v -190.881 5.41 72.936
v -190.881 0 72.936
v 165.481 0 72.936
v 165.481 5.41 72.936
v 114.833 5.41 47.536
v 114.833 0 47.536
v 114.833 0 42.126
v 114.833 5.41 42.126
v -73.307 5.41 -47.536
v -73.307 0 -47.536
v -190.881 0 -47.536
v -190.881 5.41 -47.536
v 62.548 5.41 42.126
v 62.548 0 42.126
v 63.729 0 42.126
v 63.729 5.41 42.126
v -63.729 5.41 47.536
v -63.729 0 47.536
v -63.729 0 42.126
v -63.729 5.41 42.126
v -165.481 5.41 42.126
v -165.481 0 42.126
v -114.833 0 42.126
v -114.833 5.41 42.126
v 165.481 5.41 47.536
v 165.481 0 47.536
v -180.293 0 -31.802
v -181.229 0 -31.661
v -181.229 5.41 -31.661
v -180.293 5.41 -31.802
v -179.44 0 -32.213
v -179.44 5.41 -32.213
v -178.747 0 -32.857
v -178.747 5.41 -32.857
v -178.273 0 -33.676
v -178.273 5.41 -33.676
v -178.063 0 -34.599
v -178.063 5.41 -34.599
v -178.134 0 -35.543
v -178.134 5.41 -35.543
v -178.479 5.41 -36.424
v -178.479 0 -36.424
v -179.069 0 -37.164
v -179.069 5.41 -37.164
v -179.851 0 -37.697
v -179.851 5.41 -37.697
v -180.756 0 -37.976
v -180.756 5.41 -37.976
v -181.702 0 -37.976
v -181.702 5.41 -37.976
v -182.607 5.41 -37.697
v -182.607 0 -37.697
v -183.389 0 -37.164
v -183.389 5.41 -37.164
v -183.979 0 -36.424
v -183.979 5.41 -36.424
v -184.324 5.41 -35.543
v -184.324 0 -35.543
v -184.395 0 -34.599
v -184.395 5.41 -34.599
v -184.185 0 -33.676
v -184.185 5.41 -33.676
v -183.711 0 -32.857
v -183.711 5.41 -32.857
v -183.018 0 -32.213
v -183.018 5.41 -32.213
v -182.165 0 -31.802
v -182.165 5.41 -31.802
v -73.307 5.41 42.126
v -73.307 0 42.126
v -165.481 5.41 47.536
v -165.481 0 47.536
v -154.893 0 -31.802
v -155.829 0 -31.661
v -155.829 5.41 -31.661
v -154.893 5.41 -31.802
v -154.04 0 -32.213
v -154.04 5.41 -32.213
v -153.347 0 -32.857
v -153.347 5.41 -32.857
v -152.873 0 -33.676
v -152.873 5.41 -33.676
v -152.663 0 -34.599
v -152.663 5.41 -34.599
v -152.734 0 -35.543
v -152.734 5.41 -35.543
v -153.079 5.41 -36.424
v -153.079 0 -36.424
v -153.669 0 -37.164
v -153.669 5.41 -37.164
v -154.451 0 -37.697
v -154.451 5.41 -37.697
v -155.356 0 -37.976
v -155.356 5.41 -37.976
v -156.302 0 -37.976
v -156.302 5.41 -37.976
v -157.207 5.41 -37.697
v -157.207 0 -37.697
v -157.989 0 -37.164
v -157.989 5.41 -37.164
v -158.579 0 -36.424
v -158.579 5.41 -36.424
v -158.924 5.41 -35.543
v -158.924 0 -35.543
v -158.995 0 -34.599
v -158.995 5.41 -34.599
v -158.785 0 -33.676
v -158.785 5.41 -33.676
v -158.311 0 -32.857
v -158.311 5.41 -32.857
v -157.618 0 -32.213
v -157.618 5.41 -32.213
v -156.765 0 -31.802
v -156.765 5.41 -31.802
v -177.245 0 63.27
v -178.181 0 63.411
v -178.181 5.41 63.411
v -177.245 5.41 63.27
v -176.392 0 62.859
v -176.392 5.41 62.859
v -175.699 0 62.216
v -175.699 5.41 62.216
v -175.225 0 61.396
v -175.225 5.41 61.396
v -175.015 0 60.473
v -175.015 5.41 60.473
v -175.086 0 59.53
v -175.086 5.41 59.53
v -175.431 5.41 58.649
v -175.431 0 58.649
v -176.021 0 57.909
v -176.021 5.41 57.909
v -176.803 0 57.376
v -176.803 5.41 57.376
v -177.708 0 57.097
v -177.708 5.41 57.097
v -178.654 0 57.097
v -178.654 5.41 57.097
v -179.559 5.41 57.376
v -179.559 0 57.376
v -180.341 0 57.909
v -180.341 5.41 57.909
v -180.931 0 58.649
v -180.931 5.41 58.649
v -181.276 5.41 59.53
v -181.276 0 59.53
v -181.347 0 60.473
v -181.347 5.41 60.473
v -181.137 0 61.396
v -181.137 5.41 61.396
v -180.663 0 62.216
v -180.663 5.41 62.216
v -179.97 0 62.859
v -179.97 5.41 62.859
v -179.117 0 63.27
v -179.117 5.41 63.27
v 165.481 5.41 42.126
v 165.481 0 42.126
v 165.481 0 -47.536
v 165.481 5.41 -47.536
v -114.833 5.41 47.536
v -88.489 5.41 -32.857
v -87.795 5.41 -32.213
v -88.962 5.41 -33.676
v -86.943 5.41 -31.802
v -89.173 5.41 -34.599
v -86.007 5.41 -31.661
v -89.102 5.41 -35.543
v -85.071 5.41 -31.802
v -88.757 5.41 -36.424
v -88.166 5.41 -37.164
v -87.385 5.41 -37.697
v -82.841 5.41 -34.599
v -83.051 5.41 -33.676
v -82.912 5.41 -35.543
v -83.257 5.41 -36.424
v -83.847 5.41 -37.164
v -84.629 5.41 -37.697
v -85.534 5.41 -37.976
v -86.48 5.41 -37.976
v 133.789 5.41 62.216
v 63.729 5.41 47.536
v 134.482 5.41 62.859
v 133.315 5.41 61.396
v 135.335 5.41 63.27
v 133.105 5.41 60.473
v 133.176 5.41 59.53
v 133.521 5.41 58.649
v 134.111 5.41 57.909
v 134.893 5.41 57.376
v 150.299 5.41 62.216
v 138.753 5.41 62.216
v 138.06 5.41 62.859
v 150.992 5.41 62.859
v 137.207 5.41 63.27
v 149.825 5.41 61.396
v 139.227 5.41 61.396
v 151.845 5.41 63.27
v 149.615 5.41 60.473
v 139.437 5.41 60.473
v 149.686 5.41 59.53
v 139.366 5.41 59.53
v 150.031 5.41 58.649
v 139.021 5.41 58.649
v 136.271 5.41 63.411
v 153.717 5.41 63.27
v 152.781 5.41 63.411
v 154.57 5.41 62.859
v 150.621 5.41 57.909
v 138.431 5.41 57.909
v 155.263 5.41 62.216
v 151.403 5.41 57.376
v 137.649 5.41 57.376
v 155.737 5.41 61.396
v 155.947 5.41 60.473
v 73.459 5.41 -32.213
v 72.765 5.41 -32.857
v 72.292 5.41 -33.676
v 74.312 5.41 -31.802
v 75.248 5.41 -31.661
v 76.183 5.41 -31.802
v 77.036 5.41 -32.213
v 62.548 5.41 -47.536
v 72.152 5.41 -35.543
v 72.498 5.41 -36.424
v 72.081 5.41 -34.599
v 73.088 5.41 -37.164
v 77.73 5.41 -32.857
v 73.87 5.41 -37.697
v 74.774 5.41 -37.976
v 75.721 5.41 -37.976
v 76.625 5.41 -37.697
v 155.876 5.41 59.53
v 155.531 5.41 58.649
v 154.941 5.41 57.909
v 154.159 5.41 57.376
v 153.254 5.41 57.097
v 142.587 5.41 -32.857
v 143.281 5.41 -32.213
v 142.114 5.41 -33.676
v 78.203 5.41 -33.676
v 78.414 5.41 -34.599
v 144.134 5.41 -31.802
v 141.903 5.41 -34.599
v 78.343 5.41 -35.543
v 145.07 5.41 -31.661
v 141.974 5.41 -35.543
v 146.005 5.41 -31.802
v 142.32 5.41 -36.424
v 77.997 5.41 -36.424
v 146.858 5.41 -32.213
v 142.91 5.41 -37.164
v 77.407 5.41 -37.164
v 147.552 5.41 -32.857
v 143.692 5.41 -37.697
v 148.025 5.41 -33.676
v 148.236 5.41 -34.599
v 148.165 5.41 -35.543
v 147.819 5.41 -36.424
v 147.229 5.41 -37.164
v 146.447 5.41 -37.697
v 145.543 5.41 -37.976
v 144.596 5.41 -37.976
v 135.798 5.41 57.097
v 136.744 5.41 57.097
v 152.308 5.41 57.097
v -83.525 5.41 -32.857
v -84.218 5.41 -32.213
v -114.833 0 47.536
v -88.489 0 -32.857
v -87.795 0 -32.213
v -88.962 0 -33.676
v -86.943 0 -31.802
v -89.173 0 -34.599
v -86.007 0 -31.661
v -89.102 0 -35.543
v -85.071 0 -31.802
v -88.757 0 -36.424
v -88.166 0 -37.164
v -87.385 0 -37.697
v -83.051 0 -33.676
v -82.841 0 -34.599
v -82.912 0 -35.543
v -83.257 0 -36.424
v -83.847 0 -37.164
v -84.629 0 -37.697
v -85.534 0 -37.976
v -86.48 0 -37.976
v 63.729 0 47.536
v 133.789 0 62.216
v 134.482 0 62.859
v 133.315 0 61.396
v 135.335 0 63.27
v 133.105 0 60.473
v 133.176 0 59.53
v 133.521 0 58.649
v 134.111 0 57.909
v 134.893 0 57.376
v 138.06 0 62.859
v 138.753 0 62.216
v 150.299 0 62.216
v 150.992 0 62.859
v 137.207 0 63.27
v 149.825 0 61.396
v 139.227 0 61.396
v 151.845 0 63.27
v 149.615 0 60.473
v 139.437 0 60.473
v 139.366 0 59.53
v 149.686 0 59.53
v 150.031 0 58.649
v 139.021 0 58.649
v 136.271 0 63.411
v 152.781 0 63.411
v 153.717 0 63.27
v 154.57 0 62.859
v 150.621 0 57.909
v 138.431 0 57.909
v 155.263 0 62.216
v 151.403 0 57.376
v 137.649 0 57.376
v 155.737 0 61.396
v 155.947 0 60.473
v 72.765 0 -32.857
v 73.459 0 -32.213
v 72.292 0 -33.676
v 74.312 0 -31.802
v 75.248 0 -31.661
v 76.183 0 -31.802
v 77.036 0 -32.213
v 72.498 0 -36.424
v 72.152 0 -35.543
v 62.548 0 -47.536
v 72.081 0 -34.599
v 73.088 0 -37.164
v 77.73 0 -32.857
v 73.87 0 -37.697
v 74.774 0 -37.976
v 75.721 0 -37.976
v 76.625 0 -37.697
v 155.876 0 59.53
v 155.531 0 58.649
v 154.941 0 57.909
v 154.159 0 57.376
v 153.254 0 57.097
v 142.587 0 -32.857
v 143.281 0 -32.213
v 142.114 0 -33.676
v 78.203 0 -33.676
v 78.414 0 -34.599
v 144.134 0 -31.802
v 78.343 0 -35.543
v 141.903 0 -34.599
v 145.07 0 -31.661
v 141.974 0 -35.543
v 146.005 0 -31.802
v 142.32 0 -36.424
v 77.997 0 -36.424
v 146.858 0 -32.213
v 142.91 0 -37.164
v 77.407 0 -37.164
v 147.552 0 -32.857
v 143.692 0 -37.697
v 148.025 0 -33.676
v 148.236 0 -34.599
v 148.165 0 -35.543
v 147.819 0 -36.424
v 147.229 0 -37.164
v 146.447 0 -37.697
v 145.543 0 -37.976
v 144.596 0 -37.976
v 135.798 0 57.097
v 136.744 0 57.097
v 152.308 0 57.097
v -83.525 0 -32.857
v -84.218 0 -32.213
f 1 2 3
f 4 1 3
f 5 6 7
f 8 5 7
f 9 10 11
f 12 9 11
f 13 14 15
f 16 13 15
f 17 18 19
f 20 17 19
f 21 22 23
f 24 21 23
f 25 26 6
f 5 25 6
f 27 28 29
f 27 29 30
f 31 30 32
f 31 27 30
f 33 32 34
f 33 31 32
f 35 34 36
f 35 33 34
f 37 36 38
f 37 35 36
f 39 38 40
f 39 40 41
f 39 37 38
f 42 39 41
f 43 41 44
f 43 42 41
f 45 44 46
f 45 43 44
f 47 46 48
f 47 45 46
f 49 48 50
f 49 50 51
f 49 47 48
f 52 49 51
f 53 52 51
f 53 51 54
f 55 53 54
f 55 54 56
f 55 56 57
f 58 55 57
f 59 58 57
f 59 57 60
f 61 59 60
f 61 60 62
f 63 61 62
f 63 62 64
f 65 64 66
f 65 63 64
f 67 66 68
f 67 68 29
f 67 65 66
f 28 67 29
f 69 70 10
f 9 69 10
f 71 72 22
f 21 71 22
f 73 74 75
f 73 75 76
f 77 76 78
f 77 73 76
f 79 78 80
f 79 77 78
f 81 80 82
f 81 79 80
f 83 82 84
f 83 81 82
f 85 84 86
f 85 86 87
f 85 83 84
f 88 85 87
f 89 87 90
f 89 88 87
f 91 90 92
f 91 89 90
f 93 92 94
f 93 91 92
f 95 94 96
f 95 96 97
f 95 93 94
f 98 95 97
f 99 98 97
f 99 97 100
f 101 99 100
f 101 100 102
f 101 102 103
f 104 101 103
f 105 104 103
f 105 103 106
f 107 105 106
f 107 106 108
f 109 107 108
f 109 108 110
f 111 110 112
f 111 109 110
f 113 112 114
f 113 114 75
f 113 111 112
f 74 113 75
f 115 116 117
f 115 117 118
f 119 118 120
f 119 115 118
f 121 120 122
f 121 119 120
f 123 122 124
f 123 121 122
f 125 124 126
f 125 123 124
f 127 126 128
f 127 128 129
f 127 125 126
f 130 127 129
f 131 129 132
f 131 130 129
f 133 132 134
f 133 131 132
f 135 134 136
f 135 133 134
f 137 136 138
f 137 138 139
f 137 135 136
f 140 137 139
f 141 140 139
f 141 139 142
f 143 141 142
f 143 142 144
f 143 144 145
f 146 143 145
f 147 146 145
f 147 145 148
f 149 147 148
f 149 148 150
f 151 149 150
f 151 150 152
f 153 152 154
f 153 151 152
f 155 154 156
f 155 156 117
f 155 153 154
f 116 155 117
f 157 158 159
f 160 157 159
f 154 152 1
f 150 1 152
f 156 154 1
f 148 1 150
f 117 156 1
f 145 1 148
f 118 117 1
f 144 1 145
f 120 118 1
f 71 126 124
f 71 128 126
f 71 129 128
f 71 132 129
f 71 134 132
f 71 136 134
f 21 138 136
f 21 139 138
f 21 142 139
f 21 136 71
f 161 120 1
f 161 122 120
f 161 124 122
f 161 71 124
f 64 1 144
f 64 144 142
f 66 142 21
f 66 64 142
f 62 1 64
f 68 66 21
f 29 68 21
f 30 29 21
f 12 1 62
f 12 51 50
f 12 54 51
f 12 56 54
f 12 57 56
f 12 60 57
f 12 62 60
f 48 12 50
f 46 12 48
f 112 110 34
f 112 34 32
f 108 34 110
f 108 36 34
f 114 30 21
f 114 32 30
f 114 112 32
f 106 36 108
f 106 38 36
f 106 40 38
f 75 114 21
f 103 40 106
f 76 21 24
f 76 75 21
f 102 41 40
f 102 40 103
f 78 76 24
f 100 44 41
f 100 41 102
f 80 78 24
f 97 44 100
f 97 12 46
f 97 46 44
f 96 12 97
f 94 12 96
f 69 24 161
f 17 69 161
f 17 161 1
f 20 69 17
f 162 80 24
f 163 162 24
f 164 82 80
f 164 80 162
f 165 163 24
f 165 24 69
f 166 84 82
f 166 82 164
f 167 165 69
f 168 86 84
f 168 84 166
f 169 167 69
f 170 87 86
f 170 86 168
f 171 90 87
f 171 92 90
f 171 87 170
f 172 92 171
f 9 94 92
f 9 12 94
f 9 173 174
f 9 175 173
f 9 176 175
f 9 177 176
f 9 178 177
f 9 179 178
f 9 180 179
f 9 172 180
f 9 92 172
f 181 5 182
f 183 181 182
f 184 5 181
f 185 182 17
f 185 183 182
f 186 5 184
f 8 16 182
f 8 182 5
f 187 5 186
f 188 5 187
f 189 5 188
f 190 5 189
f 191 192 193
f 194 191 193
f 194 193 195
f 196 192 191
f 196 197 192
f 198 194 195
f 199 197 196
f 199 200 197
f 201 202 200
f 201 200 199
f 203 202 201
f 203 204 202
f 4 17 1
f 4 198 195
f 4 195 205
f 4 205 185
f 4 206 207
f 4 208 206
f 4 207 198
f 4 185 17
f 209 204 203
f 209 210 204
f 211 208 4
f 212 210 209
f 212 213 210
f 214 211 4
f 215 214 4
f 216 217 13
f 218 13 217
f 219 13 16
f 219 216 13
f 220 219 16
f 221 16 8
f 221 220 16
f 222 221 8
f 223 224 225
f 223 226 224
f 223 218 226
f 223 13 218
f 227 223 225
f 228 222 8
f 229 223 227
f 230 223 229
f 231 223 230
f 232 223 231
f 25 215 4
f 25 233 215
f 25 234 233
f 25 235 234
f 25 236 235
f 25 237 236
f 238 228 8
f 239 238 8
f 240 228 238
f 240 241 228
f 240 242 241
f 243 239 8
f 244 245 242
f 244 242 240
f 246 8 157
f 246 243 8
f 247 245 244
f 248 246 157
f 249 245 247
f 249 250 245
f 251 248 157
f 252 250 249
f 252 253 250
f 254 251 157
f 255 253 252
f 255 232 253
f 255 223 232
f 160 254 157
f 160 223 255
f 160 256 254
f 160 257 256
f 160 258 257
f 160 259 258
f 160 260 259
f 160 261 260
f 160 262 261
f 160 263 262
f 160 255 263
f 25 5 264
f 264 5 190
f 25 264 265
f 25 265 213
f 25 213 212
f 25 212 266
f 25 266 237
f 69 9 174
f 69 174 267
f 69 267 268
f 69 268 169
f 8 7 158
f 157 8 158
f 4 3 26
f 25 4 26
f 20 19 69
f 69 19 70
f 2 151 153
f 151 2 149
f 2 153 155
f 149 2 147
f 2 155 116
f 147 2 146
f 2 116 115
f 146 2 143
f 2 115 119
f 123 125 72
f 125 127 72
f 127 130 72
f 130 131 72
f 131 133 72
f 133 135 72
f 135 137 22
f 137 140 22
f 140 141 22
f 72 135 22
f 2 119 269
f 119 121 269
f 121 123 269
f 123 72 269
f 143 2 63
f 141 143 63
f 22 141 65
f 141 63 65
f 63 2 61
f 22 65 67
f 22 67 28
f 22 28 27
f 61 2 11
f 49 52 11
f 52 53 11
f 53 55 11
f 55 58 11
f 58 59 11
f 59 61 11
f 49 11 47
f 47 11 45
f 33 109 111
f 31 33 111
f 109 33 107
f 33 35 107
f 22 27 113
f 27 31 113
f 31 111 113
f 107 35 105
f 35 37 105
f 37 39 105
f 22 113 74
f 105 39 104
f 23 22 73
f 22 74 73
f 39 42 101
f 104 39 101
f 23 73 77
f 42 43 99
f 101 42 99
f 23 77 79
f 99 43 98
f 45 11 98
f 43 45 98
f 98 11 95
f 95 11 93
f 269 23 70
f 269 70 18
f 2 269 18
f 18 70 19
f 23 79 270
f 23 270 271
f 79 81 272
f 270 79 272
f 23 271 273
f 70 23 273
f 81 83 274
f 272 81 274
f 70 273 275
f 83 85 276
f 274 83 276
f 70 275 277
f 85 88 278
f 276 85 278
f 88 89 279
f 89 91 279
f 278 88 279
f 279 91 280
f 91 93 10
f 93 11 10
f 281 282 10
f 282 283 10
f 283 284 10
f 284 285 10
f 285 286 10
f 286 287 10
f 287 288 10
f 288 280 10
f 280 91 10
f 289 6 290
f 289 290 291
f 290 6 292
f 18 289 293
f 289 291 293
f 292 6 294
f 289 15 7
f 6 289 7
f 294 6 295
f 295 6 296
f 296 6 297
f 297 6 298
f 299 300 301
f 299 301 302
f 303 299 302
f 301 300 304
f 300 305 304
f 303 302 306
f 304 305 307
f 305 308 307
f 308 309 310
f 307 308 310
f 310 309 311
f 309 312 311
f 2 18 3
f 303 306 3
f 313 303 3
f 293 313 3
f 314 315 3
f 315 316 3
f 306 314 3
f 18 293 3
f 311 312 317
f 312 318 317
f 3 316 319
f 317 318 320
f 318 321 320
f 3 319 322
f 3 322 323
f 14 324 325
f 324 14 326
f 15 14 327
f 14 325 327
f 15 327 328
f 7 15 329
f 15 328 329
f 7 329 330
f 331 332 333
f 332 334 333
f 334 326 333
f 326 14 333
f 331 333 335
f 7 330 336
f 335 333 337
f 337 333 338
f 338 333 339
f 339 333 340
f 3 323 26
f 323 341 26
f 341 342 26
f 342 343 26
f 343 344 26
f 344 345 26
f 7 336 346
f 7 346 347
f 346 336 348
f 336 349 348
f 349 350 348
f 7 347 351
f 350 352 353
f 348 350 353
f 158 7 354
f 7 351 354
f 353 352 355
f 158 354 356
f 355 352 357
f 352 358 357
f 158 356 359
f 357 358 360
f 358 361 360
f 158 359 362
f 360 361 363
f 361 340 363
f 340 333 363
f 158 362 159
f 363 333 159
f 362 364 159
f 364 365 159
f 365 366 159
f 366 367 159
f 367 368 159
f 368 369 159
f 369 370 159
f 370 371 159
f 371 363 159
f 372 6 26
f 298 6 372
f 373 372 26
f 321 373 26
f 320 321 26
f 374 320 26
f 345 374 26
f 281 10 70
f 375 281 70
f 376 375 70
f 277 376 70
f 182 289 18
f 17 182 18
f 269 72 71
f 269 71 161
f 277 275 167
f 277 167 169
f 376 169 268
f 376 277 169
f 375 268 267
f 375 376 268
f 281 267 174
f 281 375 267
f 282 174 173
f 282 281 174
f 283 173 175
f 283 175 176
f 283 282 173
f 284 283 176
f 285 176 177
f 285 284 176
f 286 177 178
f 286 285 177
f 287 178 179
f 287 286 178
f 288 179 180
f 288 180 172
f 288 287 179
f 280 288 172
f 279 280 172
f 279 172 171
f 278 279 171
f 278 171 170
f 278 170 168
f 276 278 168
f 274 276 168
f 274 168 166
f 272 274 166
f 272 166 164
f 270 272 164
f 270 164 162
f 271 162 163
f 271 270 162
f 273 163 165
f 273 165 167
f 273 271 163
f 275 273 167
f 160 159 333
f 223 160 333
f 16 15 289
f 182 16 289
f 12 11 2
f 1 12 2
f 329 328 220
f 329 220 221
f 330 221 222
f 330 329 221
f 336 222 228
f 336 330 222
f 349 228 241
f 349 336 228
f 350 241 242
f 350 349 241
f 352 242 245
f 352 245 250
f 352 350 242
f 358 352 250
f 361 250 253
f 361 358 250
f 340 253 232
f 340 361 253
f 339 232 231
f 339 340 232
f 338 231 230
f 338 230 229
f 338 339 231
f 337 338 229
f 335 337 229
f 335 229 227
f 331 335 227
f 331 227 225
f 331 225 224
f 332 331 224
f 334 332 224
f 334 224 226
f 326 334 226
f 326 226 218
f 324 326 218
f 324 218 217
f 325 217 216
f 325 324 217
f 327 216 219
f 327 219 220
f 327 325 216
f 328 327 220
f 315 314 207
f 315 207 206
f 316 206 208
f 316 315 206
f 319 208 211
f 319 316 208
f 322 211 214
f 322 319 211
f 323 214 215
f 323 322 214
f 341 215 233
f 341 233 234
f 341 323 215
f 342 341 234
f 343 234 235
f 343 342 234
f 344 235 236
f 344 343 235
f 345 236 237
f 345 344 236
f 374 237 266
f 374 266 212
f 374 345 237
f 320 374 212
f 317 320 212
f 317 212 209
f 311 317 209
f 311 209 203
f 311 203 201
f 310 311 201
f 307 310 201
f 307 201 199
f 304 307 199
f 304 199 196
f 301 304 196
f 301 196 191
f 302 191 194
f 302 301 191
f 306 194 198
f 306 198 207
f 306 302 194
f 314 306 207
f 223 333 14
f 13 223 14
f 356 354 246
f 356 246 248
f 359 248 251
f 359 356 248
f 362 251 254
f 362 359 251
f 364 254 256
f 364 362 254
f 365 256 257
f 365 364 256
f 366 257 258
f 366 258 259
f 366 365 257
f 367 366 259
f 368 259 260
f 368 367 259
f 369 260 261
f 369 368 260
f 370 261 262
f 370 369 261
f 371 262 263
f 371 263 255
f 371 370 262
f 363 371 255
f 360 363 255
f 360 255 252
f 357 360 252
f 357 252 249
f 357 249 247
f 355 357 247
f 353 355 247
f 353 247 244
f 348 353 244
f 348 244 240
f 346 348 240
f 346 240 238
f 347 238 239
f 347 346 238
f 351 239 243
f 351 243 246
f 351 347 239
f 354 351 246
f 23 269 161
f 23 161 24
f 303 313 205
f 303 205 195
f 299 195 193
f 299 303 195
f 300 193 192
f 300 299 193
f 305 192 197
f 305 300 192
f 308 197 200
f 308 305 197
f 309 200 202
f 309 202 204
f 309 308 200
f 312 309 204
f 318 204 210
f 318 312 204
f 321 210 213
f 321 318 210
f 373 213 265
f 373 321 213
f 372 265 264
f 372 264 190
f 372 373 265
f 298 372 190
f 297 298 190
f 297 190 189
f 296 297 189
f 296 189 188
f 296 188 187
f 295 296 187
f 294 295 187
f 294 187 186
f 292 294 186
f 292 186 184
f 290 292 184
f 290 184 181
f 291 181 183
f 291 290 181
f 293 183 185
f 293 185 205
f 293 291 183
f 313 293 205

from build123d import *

# Parameters (mm, degrees)
SKETCH1_W           = 50.6476
SKETCH1_H           = 5.4102
SKETCH1_R           = 3.175
BOSS_EXTRUDE1_DEPTH = 5.4102


with BuildPart() as part:
    # Sketch1 → Boss-Extrude1 (new body)
    with BuildSketch(Plane(origin=(0, 0, 0), x_dir=(1, 0, 0), z_dir=(0, 1, 0))):
        Polygon((-190.881, 47.5361), (-190.881, -72.9361), (165.481, -72.9361), (165.481, -47.5361), (114.8334, -47.5361), (114.8334, -42.1259), (165.481, -42.1259), (165.481, 47.5361), (62.5475, 47.5361), (62.5475, -42.1259), (63.7286, -42.1259), (63.7286, -47.5361), (-63.7286, -47.5361), (-63.7286, -42.1259), (-73.30694, -42.1259), (-73.30694, 47.5361), align=None)
        with Locations((-140.1572, -44.831)):
            Rectangle(SKETCH1_W, SKETCH1_H, mode=Mode.SUBTRACT)
        with Locations(Location((-181.229, 34.8361, 0), (0, 0, 270))):
            Circle(SKETCH1_R, mode=Mode.SUBTRACT)
        with Locations(Location((152.781, -60.2361, 0), (0, 0, 270))):
            Circle(SKETCH1_R, mode=Mode.SUBTRACT)
        with Locations(Location((-178.181, -60.2361, 0), (0, 0, 270))):
            Circle(SKETCH1_R, mode=Mode.SUBTRACT)
        with Locations(Location((136.271, -60.2361, 0), (0, 0, 270))):
            Circle(SKETCH1_R, mode=Mode.SUBTRACT)
        with Locations(Location((-155.829, 34.8361, 0), (0, 0, 270))):
            Circle(SKETCH1_R, mode=Mode.SUBTRACT)
        with Locations(Location((-86.00694, 34.8361, 0), (0, 0, 270))):
            Circle(SKETCH1_R, mode=Mode.SUBTRACT)
        with Locations(Location((145.06956, 34.8361, 0), (0, 0, 270))):
            Circle(SKETCH1_R, mode=Mode.SUBTRACT)
        with Locations(Location((75.2475, 34.8361, 0), (0, 0, 270))):
            Circle(SKETCH1_R, mode=Mode.SUBTRACT)
    extrude(amount=BOSS_EXTRUDE1_DEPTH)


solid = part.part
